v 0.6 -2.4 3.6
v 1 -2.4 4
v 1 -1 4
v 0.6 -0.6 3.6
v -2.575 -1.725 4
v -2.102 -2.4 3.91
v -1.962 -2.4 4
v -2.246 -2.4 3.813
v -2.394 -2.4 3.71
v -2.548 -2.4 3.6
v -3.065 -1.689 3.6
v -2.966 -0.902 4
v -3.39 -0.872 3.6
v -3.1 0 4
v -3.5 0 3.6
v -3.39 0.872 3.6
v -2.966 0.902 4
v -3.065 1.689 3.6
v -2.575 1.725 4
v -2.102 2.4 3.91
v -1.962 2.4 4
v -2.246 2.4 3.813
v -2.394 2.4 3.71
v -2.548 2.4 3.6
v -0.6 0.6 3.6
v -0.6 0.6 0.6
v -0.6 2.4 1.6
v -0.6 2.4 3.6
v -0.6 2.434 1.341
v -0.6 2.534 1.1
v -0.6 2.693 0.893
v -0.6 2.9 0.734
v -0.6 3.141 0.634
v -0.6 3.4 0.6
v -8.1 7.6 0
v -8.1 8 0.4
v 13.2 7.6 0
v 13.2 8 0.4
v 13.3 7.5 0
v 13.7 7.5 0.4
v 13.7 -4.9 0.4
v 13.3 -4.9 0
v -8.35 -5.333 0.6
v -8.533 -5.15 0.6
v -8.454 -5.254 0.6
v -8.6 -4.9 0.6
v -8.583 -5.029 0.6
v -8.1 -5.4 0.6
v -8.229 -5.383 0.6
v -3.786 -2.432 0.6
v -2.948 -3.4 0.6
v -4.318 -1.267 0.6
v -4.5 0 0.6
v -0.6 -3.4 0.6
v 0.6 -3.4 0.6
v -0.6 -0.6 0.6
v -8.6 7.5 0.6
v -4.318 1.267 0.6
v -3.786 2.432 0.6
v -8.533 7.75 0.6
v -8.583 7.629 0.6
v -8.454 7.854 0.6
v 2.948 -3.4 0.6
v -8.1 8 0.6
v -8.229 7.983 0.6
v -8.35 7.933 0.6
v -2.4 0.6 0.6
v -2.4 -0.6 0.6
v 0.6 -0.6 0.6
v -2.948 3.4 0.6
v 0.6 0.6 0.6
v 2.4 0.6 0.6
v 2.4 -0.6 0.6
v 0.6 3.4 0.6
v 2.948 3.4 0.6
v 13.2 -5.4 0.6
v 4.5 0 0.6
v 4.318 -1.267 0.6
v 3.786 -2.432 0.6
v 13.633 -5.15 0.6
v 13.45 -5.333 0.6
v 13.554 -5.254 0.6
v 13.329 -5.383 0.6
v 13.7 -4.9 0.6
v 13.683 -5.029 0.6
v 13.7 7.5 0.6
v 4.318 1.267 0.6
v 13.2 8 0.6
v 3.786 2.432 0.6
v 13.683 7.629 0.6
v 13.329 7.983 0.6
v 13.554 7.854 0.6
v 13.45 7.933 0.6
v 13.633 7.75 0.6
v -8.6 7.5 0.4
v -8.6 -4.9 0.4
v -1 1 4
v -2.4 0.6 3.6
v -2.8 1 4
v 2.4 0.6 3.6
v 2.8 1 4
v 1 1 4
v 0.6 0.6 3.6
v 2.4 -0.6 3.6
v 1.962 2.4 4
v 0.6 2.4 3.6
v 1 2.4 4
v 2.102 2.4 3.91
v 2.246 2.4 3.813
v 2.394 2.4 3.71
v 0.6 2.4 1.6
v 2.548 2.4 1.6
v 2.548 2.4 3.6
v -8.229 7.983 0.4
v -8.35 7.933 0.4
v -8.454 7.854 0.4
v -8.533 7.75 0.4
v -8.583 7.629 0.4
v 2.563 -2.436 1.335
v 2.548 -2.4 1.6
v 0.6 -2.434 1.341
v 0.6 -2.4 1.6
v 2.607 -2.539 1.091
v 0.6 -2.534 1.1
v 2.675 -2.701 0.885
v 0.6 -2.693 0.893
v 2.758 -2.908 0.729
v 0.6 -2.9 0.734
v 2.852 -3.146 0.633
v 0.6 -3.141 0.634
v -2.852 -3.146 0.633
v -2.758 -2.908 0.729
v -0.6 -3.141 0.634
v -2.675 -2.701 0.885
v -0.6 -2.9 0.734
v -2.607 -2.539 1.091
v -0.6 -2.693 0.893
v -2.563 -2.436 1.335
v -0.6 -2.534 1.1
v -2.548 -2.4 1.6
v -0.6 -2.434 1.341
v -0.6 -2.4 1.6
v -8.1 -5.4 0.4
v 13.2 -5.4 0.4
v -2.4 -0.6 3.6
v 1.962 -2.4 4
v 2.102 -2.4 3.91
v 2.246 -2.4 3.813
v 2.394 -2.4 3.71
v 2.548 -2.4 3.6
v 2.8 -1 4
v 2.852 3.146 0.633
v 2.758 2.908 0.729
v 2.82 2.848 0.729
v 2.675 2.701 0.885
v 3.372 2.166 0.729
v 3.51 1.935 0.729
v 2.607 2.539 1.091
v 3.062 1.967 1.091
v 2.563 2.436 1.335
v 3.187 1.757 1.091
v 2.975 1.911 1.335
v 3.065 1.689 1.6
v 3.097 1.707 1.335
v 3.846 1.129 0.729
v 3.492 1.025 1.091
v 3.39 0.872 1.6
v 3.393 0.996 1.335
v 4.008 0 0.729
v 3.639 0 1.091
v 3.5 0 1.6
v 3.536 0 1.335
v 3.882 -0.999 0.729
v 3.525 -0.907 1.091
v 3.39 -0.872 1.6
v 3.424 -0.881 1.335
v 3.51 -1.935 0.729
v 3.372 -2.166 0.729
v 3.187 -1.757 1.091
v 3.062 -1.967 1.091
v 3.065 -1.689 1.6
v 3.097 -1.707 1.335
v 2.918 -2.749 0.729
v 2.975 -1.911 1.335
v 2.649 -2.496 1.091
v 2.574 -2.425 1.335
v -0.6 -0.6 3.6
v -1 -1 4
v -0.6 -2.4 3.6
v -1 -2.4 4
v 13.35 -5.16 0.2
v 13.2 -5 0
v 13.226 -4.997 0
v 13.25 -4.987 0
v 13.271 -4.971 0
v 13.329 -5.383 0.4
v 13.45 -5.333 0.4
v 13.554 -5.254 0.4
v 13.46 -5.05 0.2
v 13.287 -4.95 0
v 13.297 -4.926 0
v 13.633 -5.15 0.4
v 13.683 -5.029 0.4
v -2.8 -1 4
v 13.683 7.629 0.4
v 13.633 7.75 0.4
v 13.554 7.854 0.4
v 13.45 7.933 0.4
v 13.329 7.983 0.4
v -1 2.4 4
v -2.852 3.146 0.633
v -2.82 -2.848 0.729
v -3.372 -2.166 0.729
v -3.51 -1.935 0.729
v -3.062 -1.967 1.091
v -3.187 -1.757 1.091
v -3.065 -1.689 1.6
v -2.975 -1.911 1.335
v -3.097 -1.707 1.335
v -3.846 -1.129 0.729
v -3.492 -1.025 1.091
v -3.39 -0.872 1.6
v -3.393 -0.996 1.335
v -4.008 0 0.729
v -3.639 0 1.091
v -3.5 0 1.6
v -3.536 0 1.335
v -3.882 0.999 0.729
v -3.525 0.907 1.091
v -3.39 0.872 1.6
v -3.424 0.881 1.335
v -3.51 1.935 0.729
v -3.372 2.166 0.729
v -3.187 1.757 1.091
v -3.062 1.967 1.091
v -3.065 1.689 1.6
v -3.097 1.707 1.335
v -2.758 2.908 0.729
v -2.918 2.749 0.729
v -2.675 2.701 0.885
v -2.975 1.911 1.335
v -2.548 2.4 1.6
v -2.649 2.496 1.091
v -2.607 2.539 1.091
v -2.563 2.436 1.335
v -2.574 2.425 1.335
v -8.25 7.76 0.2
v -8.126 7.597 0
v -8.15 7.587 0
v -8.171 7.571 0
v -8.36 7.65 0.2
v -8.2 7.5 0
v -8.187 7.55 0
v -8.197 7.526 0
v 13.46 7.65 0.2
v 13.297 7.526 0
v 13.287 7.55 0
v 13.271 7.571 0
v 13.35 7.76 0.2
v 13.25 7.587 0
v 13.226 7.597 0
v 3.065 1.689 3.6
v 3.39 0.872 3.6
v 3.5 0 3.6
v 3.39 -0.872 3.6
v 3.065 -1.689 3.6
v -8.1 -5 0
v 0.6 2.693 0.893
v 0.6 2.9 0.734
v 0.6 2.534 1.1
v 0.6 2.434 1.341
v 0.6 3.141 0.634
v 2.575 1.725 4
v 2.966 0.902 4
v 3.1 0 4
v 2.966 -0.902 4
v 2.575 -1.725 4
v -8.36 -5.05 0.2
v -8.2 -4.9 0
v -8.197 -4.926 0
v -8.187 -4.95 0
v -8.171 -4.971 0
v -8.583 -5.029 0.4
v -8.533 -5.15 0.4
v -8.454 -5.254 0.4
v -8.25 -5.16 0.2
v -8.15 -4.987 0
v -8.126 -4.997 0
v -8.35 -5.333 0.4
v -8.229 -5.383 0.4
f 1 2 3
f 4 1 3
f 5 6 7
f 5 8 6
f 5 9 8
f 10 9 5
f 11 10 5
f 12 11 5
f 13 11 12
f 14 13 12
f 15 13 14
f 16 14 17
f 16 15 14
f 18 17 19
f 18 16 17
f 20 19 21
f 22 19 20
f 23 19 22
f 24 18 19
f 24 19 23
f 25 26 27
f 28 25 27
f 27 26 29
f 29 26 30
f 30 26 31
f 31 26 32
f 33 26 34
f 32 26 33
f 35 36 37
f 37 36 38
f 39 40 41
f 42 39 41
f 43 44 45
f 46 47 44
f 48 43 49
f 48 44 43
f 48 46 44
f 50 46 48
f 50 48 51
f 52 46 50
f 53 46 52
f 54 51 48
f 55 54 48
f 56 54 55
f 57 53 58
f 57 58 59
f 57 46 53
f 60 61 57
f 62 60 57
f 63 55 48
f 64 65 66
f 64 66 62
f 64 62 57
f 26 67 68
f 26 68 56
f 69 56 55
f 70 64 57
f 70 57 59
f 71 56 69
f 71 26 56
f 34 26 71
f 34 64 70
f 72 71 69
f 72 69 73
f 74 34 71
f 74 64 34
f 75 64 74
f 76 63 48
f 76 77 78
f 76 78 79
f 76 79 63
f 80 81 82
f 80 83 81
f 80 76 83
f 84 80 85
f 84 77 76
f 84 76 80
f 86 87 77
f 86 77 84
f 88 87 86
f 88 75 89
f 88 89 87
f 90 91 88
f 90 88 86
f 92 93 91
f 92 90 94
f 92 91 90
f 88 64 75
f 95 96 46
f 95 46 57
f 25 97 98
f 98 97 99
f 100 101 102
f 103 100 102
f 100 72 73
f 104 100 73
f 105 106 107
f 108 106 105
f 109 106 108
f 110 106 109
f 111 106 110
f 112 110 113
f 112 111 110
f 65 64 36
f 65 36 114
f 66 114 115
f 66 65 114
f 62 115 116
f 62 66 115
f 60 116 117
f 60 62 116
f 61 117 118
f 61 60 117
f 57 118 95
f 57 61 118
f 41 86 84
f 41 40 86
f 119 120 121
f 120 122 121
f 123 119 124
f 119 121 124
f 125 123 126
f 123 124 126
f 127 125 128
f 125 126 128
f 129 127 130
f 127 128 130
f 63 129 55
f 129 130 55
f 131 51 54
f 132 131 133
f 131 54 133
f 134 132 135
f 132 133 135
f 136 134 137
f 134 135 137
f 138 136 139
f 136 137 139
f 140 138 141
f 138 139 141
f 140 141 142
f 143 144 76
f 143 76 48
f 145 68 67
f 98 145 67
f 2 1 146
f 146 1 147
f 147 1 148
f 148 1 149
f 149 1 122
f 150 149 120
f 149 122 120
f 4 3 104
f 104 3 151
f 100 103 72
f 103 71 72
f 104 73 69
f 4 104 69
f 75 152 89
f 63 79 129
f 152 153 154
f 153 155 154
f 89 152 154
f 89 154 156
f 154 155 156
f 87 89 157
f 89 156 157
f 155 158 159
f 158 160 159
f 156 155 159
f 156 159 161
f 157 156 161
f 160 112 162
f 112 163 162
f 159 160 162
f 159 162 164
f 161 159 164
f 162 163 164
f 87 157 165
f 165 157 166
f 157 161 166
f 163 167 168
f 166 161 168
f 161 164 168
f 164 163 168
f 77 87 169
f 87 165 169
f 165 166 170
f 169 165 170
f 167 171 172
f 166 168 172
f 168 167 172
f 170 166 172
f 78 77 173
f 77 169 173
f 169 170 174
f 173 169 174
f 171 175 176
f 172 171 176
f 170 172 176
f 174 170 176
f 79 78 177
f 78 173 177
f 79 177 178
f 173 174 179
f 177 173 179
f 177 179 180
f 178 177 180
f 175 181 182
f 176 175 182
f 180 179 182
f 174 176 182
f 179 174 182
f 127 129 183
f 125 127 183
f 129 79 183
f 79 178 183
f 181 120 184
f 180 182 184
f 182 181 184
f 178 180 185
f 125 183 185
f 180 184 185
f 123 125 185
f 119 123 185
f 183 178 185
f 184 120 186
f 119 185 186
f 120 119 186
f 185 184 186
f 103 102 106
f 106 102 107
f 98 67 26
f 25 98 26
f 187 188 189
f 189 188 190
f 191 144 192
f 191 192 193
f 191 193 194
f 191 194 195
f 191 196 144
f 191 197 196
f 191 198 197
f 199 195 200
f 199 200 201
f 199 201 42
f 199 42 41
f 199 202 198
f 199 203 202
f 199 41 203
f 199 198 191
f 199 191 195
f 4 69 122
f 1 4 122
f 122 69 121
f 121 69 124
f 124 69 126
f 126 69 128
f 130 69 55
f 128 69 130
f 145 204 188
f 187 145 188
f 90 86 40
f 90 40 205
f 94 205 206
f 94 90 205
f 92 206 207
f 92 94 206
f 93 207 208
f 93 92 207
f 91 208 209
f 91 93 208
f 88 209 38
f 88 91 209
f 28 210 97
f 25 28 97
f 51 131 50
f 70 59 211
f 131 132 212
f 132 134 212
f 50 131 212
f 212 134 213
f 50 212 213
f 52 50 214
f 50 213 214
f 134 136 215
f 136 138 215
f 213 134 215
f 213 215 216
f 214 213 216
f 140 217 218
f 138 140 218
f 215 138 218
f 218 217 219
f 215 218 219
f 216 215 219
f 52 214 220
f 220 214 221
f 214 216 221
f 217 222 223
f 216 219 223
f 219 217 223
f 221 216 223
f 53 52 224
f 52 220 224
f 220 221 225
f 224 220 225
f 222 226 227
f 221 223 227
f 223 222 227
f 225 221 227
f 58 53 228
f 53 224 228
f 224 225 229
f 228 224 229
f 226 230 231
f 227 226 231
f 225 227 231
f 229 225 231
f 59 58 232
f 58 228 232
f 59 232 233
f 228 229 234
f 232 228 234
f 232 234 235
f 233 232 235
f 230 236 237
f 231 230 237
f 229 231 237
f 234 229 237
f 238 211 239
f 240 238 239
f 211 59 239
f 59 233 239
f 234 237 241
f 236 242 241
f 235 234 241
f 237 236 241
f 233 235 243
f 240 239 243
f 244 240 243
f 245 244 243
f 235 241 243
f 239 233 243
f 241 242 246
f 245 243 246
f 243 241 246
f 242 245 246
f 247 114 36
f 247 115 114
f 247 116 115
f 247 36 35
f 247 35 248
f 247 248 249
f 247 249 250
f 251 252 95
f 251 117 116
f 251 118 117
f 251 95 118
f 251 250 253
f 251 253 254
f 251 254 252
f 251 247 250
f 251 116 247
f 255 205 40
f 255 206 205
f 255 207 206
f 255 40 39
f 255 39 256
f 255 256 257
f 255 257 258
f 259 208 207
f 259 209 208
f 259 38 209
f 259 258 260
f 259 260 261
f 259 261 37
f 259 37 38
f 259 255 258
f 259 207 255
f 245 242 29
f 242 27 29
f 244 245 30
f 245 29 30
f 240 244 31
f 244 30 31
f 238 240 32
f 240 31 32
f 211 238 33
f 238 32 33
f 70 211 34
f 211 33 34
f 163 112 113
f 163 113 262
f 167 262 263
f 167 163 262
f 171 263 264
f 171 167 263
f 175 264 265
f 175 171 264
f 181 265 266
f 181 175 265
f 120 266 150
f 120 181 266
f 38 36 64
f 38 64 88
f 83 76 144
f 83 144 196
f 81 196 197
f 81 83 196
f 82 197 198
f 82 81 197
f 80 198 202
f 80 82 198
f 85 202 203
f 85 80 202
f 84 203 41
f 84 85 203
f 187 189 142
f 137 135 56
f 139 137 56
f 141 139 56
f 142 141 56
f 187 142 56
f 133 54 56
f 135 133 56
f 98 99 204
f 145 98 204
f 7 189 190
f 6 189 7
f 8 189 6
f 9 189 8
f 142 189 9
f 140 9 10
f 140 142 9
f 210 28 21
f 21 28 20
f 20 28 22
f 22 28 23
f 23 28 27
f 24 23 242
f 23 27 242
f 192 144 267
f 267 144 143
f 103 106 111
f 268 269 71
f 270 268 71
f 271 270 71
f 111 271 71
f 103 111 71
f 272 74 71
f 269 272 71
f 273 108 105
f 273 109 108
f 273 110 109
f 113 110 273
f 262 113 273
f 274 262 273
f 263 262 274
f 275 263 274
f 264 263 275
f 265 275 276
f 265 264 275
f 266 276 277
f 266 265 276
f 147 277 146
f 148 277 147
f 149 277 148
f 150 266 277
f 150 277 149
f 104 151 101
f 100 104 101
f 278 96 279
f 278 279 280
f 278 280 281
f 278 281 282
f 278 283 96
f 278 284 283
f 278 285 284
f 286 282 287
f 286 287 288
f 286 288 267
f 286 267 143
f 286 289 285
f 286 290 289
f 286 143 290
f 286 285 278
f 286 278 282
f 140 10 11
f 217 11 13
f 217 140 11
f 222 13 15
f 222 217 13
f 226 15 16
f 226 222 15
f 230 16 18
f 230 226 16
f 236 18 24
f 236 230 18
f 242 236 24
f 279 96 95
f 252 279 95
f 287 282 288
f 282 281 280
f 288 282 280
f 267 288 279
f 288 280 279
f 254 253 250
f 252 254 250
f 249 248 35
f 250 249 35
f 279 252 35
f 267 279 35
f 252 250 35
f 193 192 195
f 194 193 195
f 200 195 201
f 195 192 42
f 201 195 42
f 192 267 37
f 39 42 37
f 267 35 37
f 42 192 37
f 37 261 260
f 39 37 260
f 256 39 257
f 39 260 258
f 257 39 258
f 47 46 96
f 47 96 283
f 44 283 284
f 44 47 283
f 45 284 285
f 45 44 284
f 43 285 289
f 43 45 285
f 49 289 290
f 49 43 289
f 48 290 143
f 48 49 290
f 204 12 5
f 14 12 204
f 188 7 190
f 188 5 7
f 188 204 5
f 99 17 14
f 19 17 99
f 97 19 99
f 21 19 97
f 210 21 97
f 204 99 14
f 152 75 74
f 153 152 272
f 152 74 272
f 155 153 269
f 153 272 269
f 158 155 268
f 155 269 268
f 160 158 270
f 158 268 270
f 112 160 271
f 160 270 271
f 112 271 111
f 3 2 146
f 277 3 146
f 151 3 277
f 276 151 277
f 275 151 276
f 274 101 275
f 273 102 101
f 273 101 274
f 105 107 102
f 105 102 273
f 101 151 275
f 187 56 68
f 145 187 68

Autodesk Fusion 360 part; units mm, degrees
sketch "Sketch1" plane through (0, 0, 0) normal (0, 0, 1) x (1, 0, 0)
  line L0 (16.3, 9) -> (-16.3, 9) construction
  line L1 (-16.3, 9) -> (-16.3, -9) construction
  line L2 (-16.3, -9) -> (16.3, -9) construction
  line L3 (16.3, -9) -> (16.3, 9) construction
  line L4 (16.3, 9) -> (-16.3, -9) construction
  line L5 (-16.3, 9) -> (16.3, -9) construction
  line L6 (-8.6, 8) -> (13.7, 8)
  line L7 (13.7, 8) -> (13.7, -5.4)
  line L8 (13.7, -5.4) -> (-8.6, -5.4)
  line L9 (-8.6, -5.4) -> (-8.6, 8)
  circle A0 centre (0, 0) radius 3.5
  line L10 (2.4, -0.6) -> (-2.4, -0.6)
  line L11 (-2.4, -0.6) -> (-2.4, 0.6)
  line L12 (-2.4, 0.6) -> (2.4, 0.6)
  line L13 (2.4, 0.6) -> (2.4, -0.6)
  line L14 (2.4, -0.6) -> (-2.4, 0.6) construction
  line L15 (-2.4, -0.6) -> (2.4, 0.6) construction
  line L16 (0.6, -2.4) -> (-0.6, -2.4)
  line L17 (-0.6, -2.4) -> (-0.6, 2.4)
  line L18 (-0.6, 2.4) -> (0.6, 2.4)
  line L19 (0.6, 2.4) -> (0.6, -2.4)
  line L20 (0.6, -2.4) -> (-0.6, 2.4) construction
  line L21 (-0.6, -2.4) -> (0.6, 2.4) construction
  line L22 (-0.6, 2.4) -> (-2.5475, 2.4)
  line L23 (0.6, 2.4) -> (2.5475, 2.4)
  line L24 (-0.6, -2.4) -> (-2.5475, -2.4)
  line L25 (0.6, -2.4) -> (2.5475, -2.4)
  dimension "d1" = 32.6
  dimension "d2" = 18
  dimension "d3" = 3.6
  dimension "d4" = 1
  dimension "d5" = 2.6
  dimension "d6" = 7.7
  dimension "d7" = 7
  dimension "d8" = 4.8
  dimension "d9" = 1.2
  dimension "d10" = 1.2
  dimension "d11" = 4.8
extrude "Extrude1" add sketch "Sketch1" along normal blind 0.6 contours L6 L7 L8 L9 | A0 L10 L12 L13 L19 L23 L25 | A0 L18 L22 L23 | A0 L16 L24 L25 | A0 L10 L11 L12 L17 L22 L24 | L12 L17 L18 L19 | L10 L16 L17 L19 | L10 L12 L17 L19 | L10 L12 L13 L19 | L10 L11 L12 L17
extrude "Extrude2" add sketch "Sketch1" along normal blind 4 contours A0 L10 L12 L13 L19 L23 L25 | A0 L10 L11 L12 L17 L22 L24
fillet "Fillet1" radius 1 6 edges at (-1.5738, -2.4, 0.6) (-3.5, 0, 0.6) (1.5738, -2.4, 0.6) (3.5, 0, 0.6) (1.5738, 2.4, 0.6) (-1.5738, 2.4, 0.6)
fillet "Fillet1" radius 0.5 4 edges at (13.7, 8, 0.3) (-8.6, 8, 0.3) (13.7, -5.4, 0.3) (-8.6, -5.4, 0.3)
chamfer "Chamfer1" distance 0.4 angle 45 20 edges at (-8.4536, 7.8536, 0) (2.55, 8, 0) (13.5536, 7.8536, 0) (13.7, 1.3, 0) (13.5536, -5.2536, 0) (2.55, -5.4, 0) (-8.4536, -5.2536, 0) (-8.6, 1.3, 0) (-0.6, 1.5, 4) (-1.5, 0.6, 4) (-2.4, 0, 4) (-1.5, -0.6, 4) (-0.6, -1.5, 4) (0.6, -1.5, 4) (1.5, -0.6, 4) (2.4, 0, 4) (1.5, 0.6, 4) (0.6, 1.5, 4) (3.5, 0, 4) (-3.5, 0, 4)
